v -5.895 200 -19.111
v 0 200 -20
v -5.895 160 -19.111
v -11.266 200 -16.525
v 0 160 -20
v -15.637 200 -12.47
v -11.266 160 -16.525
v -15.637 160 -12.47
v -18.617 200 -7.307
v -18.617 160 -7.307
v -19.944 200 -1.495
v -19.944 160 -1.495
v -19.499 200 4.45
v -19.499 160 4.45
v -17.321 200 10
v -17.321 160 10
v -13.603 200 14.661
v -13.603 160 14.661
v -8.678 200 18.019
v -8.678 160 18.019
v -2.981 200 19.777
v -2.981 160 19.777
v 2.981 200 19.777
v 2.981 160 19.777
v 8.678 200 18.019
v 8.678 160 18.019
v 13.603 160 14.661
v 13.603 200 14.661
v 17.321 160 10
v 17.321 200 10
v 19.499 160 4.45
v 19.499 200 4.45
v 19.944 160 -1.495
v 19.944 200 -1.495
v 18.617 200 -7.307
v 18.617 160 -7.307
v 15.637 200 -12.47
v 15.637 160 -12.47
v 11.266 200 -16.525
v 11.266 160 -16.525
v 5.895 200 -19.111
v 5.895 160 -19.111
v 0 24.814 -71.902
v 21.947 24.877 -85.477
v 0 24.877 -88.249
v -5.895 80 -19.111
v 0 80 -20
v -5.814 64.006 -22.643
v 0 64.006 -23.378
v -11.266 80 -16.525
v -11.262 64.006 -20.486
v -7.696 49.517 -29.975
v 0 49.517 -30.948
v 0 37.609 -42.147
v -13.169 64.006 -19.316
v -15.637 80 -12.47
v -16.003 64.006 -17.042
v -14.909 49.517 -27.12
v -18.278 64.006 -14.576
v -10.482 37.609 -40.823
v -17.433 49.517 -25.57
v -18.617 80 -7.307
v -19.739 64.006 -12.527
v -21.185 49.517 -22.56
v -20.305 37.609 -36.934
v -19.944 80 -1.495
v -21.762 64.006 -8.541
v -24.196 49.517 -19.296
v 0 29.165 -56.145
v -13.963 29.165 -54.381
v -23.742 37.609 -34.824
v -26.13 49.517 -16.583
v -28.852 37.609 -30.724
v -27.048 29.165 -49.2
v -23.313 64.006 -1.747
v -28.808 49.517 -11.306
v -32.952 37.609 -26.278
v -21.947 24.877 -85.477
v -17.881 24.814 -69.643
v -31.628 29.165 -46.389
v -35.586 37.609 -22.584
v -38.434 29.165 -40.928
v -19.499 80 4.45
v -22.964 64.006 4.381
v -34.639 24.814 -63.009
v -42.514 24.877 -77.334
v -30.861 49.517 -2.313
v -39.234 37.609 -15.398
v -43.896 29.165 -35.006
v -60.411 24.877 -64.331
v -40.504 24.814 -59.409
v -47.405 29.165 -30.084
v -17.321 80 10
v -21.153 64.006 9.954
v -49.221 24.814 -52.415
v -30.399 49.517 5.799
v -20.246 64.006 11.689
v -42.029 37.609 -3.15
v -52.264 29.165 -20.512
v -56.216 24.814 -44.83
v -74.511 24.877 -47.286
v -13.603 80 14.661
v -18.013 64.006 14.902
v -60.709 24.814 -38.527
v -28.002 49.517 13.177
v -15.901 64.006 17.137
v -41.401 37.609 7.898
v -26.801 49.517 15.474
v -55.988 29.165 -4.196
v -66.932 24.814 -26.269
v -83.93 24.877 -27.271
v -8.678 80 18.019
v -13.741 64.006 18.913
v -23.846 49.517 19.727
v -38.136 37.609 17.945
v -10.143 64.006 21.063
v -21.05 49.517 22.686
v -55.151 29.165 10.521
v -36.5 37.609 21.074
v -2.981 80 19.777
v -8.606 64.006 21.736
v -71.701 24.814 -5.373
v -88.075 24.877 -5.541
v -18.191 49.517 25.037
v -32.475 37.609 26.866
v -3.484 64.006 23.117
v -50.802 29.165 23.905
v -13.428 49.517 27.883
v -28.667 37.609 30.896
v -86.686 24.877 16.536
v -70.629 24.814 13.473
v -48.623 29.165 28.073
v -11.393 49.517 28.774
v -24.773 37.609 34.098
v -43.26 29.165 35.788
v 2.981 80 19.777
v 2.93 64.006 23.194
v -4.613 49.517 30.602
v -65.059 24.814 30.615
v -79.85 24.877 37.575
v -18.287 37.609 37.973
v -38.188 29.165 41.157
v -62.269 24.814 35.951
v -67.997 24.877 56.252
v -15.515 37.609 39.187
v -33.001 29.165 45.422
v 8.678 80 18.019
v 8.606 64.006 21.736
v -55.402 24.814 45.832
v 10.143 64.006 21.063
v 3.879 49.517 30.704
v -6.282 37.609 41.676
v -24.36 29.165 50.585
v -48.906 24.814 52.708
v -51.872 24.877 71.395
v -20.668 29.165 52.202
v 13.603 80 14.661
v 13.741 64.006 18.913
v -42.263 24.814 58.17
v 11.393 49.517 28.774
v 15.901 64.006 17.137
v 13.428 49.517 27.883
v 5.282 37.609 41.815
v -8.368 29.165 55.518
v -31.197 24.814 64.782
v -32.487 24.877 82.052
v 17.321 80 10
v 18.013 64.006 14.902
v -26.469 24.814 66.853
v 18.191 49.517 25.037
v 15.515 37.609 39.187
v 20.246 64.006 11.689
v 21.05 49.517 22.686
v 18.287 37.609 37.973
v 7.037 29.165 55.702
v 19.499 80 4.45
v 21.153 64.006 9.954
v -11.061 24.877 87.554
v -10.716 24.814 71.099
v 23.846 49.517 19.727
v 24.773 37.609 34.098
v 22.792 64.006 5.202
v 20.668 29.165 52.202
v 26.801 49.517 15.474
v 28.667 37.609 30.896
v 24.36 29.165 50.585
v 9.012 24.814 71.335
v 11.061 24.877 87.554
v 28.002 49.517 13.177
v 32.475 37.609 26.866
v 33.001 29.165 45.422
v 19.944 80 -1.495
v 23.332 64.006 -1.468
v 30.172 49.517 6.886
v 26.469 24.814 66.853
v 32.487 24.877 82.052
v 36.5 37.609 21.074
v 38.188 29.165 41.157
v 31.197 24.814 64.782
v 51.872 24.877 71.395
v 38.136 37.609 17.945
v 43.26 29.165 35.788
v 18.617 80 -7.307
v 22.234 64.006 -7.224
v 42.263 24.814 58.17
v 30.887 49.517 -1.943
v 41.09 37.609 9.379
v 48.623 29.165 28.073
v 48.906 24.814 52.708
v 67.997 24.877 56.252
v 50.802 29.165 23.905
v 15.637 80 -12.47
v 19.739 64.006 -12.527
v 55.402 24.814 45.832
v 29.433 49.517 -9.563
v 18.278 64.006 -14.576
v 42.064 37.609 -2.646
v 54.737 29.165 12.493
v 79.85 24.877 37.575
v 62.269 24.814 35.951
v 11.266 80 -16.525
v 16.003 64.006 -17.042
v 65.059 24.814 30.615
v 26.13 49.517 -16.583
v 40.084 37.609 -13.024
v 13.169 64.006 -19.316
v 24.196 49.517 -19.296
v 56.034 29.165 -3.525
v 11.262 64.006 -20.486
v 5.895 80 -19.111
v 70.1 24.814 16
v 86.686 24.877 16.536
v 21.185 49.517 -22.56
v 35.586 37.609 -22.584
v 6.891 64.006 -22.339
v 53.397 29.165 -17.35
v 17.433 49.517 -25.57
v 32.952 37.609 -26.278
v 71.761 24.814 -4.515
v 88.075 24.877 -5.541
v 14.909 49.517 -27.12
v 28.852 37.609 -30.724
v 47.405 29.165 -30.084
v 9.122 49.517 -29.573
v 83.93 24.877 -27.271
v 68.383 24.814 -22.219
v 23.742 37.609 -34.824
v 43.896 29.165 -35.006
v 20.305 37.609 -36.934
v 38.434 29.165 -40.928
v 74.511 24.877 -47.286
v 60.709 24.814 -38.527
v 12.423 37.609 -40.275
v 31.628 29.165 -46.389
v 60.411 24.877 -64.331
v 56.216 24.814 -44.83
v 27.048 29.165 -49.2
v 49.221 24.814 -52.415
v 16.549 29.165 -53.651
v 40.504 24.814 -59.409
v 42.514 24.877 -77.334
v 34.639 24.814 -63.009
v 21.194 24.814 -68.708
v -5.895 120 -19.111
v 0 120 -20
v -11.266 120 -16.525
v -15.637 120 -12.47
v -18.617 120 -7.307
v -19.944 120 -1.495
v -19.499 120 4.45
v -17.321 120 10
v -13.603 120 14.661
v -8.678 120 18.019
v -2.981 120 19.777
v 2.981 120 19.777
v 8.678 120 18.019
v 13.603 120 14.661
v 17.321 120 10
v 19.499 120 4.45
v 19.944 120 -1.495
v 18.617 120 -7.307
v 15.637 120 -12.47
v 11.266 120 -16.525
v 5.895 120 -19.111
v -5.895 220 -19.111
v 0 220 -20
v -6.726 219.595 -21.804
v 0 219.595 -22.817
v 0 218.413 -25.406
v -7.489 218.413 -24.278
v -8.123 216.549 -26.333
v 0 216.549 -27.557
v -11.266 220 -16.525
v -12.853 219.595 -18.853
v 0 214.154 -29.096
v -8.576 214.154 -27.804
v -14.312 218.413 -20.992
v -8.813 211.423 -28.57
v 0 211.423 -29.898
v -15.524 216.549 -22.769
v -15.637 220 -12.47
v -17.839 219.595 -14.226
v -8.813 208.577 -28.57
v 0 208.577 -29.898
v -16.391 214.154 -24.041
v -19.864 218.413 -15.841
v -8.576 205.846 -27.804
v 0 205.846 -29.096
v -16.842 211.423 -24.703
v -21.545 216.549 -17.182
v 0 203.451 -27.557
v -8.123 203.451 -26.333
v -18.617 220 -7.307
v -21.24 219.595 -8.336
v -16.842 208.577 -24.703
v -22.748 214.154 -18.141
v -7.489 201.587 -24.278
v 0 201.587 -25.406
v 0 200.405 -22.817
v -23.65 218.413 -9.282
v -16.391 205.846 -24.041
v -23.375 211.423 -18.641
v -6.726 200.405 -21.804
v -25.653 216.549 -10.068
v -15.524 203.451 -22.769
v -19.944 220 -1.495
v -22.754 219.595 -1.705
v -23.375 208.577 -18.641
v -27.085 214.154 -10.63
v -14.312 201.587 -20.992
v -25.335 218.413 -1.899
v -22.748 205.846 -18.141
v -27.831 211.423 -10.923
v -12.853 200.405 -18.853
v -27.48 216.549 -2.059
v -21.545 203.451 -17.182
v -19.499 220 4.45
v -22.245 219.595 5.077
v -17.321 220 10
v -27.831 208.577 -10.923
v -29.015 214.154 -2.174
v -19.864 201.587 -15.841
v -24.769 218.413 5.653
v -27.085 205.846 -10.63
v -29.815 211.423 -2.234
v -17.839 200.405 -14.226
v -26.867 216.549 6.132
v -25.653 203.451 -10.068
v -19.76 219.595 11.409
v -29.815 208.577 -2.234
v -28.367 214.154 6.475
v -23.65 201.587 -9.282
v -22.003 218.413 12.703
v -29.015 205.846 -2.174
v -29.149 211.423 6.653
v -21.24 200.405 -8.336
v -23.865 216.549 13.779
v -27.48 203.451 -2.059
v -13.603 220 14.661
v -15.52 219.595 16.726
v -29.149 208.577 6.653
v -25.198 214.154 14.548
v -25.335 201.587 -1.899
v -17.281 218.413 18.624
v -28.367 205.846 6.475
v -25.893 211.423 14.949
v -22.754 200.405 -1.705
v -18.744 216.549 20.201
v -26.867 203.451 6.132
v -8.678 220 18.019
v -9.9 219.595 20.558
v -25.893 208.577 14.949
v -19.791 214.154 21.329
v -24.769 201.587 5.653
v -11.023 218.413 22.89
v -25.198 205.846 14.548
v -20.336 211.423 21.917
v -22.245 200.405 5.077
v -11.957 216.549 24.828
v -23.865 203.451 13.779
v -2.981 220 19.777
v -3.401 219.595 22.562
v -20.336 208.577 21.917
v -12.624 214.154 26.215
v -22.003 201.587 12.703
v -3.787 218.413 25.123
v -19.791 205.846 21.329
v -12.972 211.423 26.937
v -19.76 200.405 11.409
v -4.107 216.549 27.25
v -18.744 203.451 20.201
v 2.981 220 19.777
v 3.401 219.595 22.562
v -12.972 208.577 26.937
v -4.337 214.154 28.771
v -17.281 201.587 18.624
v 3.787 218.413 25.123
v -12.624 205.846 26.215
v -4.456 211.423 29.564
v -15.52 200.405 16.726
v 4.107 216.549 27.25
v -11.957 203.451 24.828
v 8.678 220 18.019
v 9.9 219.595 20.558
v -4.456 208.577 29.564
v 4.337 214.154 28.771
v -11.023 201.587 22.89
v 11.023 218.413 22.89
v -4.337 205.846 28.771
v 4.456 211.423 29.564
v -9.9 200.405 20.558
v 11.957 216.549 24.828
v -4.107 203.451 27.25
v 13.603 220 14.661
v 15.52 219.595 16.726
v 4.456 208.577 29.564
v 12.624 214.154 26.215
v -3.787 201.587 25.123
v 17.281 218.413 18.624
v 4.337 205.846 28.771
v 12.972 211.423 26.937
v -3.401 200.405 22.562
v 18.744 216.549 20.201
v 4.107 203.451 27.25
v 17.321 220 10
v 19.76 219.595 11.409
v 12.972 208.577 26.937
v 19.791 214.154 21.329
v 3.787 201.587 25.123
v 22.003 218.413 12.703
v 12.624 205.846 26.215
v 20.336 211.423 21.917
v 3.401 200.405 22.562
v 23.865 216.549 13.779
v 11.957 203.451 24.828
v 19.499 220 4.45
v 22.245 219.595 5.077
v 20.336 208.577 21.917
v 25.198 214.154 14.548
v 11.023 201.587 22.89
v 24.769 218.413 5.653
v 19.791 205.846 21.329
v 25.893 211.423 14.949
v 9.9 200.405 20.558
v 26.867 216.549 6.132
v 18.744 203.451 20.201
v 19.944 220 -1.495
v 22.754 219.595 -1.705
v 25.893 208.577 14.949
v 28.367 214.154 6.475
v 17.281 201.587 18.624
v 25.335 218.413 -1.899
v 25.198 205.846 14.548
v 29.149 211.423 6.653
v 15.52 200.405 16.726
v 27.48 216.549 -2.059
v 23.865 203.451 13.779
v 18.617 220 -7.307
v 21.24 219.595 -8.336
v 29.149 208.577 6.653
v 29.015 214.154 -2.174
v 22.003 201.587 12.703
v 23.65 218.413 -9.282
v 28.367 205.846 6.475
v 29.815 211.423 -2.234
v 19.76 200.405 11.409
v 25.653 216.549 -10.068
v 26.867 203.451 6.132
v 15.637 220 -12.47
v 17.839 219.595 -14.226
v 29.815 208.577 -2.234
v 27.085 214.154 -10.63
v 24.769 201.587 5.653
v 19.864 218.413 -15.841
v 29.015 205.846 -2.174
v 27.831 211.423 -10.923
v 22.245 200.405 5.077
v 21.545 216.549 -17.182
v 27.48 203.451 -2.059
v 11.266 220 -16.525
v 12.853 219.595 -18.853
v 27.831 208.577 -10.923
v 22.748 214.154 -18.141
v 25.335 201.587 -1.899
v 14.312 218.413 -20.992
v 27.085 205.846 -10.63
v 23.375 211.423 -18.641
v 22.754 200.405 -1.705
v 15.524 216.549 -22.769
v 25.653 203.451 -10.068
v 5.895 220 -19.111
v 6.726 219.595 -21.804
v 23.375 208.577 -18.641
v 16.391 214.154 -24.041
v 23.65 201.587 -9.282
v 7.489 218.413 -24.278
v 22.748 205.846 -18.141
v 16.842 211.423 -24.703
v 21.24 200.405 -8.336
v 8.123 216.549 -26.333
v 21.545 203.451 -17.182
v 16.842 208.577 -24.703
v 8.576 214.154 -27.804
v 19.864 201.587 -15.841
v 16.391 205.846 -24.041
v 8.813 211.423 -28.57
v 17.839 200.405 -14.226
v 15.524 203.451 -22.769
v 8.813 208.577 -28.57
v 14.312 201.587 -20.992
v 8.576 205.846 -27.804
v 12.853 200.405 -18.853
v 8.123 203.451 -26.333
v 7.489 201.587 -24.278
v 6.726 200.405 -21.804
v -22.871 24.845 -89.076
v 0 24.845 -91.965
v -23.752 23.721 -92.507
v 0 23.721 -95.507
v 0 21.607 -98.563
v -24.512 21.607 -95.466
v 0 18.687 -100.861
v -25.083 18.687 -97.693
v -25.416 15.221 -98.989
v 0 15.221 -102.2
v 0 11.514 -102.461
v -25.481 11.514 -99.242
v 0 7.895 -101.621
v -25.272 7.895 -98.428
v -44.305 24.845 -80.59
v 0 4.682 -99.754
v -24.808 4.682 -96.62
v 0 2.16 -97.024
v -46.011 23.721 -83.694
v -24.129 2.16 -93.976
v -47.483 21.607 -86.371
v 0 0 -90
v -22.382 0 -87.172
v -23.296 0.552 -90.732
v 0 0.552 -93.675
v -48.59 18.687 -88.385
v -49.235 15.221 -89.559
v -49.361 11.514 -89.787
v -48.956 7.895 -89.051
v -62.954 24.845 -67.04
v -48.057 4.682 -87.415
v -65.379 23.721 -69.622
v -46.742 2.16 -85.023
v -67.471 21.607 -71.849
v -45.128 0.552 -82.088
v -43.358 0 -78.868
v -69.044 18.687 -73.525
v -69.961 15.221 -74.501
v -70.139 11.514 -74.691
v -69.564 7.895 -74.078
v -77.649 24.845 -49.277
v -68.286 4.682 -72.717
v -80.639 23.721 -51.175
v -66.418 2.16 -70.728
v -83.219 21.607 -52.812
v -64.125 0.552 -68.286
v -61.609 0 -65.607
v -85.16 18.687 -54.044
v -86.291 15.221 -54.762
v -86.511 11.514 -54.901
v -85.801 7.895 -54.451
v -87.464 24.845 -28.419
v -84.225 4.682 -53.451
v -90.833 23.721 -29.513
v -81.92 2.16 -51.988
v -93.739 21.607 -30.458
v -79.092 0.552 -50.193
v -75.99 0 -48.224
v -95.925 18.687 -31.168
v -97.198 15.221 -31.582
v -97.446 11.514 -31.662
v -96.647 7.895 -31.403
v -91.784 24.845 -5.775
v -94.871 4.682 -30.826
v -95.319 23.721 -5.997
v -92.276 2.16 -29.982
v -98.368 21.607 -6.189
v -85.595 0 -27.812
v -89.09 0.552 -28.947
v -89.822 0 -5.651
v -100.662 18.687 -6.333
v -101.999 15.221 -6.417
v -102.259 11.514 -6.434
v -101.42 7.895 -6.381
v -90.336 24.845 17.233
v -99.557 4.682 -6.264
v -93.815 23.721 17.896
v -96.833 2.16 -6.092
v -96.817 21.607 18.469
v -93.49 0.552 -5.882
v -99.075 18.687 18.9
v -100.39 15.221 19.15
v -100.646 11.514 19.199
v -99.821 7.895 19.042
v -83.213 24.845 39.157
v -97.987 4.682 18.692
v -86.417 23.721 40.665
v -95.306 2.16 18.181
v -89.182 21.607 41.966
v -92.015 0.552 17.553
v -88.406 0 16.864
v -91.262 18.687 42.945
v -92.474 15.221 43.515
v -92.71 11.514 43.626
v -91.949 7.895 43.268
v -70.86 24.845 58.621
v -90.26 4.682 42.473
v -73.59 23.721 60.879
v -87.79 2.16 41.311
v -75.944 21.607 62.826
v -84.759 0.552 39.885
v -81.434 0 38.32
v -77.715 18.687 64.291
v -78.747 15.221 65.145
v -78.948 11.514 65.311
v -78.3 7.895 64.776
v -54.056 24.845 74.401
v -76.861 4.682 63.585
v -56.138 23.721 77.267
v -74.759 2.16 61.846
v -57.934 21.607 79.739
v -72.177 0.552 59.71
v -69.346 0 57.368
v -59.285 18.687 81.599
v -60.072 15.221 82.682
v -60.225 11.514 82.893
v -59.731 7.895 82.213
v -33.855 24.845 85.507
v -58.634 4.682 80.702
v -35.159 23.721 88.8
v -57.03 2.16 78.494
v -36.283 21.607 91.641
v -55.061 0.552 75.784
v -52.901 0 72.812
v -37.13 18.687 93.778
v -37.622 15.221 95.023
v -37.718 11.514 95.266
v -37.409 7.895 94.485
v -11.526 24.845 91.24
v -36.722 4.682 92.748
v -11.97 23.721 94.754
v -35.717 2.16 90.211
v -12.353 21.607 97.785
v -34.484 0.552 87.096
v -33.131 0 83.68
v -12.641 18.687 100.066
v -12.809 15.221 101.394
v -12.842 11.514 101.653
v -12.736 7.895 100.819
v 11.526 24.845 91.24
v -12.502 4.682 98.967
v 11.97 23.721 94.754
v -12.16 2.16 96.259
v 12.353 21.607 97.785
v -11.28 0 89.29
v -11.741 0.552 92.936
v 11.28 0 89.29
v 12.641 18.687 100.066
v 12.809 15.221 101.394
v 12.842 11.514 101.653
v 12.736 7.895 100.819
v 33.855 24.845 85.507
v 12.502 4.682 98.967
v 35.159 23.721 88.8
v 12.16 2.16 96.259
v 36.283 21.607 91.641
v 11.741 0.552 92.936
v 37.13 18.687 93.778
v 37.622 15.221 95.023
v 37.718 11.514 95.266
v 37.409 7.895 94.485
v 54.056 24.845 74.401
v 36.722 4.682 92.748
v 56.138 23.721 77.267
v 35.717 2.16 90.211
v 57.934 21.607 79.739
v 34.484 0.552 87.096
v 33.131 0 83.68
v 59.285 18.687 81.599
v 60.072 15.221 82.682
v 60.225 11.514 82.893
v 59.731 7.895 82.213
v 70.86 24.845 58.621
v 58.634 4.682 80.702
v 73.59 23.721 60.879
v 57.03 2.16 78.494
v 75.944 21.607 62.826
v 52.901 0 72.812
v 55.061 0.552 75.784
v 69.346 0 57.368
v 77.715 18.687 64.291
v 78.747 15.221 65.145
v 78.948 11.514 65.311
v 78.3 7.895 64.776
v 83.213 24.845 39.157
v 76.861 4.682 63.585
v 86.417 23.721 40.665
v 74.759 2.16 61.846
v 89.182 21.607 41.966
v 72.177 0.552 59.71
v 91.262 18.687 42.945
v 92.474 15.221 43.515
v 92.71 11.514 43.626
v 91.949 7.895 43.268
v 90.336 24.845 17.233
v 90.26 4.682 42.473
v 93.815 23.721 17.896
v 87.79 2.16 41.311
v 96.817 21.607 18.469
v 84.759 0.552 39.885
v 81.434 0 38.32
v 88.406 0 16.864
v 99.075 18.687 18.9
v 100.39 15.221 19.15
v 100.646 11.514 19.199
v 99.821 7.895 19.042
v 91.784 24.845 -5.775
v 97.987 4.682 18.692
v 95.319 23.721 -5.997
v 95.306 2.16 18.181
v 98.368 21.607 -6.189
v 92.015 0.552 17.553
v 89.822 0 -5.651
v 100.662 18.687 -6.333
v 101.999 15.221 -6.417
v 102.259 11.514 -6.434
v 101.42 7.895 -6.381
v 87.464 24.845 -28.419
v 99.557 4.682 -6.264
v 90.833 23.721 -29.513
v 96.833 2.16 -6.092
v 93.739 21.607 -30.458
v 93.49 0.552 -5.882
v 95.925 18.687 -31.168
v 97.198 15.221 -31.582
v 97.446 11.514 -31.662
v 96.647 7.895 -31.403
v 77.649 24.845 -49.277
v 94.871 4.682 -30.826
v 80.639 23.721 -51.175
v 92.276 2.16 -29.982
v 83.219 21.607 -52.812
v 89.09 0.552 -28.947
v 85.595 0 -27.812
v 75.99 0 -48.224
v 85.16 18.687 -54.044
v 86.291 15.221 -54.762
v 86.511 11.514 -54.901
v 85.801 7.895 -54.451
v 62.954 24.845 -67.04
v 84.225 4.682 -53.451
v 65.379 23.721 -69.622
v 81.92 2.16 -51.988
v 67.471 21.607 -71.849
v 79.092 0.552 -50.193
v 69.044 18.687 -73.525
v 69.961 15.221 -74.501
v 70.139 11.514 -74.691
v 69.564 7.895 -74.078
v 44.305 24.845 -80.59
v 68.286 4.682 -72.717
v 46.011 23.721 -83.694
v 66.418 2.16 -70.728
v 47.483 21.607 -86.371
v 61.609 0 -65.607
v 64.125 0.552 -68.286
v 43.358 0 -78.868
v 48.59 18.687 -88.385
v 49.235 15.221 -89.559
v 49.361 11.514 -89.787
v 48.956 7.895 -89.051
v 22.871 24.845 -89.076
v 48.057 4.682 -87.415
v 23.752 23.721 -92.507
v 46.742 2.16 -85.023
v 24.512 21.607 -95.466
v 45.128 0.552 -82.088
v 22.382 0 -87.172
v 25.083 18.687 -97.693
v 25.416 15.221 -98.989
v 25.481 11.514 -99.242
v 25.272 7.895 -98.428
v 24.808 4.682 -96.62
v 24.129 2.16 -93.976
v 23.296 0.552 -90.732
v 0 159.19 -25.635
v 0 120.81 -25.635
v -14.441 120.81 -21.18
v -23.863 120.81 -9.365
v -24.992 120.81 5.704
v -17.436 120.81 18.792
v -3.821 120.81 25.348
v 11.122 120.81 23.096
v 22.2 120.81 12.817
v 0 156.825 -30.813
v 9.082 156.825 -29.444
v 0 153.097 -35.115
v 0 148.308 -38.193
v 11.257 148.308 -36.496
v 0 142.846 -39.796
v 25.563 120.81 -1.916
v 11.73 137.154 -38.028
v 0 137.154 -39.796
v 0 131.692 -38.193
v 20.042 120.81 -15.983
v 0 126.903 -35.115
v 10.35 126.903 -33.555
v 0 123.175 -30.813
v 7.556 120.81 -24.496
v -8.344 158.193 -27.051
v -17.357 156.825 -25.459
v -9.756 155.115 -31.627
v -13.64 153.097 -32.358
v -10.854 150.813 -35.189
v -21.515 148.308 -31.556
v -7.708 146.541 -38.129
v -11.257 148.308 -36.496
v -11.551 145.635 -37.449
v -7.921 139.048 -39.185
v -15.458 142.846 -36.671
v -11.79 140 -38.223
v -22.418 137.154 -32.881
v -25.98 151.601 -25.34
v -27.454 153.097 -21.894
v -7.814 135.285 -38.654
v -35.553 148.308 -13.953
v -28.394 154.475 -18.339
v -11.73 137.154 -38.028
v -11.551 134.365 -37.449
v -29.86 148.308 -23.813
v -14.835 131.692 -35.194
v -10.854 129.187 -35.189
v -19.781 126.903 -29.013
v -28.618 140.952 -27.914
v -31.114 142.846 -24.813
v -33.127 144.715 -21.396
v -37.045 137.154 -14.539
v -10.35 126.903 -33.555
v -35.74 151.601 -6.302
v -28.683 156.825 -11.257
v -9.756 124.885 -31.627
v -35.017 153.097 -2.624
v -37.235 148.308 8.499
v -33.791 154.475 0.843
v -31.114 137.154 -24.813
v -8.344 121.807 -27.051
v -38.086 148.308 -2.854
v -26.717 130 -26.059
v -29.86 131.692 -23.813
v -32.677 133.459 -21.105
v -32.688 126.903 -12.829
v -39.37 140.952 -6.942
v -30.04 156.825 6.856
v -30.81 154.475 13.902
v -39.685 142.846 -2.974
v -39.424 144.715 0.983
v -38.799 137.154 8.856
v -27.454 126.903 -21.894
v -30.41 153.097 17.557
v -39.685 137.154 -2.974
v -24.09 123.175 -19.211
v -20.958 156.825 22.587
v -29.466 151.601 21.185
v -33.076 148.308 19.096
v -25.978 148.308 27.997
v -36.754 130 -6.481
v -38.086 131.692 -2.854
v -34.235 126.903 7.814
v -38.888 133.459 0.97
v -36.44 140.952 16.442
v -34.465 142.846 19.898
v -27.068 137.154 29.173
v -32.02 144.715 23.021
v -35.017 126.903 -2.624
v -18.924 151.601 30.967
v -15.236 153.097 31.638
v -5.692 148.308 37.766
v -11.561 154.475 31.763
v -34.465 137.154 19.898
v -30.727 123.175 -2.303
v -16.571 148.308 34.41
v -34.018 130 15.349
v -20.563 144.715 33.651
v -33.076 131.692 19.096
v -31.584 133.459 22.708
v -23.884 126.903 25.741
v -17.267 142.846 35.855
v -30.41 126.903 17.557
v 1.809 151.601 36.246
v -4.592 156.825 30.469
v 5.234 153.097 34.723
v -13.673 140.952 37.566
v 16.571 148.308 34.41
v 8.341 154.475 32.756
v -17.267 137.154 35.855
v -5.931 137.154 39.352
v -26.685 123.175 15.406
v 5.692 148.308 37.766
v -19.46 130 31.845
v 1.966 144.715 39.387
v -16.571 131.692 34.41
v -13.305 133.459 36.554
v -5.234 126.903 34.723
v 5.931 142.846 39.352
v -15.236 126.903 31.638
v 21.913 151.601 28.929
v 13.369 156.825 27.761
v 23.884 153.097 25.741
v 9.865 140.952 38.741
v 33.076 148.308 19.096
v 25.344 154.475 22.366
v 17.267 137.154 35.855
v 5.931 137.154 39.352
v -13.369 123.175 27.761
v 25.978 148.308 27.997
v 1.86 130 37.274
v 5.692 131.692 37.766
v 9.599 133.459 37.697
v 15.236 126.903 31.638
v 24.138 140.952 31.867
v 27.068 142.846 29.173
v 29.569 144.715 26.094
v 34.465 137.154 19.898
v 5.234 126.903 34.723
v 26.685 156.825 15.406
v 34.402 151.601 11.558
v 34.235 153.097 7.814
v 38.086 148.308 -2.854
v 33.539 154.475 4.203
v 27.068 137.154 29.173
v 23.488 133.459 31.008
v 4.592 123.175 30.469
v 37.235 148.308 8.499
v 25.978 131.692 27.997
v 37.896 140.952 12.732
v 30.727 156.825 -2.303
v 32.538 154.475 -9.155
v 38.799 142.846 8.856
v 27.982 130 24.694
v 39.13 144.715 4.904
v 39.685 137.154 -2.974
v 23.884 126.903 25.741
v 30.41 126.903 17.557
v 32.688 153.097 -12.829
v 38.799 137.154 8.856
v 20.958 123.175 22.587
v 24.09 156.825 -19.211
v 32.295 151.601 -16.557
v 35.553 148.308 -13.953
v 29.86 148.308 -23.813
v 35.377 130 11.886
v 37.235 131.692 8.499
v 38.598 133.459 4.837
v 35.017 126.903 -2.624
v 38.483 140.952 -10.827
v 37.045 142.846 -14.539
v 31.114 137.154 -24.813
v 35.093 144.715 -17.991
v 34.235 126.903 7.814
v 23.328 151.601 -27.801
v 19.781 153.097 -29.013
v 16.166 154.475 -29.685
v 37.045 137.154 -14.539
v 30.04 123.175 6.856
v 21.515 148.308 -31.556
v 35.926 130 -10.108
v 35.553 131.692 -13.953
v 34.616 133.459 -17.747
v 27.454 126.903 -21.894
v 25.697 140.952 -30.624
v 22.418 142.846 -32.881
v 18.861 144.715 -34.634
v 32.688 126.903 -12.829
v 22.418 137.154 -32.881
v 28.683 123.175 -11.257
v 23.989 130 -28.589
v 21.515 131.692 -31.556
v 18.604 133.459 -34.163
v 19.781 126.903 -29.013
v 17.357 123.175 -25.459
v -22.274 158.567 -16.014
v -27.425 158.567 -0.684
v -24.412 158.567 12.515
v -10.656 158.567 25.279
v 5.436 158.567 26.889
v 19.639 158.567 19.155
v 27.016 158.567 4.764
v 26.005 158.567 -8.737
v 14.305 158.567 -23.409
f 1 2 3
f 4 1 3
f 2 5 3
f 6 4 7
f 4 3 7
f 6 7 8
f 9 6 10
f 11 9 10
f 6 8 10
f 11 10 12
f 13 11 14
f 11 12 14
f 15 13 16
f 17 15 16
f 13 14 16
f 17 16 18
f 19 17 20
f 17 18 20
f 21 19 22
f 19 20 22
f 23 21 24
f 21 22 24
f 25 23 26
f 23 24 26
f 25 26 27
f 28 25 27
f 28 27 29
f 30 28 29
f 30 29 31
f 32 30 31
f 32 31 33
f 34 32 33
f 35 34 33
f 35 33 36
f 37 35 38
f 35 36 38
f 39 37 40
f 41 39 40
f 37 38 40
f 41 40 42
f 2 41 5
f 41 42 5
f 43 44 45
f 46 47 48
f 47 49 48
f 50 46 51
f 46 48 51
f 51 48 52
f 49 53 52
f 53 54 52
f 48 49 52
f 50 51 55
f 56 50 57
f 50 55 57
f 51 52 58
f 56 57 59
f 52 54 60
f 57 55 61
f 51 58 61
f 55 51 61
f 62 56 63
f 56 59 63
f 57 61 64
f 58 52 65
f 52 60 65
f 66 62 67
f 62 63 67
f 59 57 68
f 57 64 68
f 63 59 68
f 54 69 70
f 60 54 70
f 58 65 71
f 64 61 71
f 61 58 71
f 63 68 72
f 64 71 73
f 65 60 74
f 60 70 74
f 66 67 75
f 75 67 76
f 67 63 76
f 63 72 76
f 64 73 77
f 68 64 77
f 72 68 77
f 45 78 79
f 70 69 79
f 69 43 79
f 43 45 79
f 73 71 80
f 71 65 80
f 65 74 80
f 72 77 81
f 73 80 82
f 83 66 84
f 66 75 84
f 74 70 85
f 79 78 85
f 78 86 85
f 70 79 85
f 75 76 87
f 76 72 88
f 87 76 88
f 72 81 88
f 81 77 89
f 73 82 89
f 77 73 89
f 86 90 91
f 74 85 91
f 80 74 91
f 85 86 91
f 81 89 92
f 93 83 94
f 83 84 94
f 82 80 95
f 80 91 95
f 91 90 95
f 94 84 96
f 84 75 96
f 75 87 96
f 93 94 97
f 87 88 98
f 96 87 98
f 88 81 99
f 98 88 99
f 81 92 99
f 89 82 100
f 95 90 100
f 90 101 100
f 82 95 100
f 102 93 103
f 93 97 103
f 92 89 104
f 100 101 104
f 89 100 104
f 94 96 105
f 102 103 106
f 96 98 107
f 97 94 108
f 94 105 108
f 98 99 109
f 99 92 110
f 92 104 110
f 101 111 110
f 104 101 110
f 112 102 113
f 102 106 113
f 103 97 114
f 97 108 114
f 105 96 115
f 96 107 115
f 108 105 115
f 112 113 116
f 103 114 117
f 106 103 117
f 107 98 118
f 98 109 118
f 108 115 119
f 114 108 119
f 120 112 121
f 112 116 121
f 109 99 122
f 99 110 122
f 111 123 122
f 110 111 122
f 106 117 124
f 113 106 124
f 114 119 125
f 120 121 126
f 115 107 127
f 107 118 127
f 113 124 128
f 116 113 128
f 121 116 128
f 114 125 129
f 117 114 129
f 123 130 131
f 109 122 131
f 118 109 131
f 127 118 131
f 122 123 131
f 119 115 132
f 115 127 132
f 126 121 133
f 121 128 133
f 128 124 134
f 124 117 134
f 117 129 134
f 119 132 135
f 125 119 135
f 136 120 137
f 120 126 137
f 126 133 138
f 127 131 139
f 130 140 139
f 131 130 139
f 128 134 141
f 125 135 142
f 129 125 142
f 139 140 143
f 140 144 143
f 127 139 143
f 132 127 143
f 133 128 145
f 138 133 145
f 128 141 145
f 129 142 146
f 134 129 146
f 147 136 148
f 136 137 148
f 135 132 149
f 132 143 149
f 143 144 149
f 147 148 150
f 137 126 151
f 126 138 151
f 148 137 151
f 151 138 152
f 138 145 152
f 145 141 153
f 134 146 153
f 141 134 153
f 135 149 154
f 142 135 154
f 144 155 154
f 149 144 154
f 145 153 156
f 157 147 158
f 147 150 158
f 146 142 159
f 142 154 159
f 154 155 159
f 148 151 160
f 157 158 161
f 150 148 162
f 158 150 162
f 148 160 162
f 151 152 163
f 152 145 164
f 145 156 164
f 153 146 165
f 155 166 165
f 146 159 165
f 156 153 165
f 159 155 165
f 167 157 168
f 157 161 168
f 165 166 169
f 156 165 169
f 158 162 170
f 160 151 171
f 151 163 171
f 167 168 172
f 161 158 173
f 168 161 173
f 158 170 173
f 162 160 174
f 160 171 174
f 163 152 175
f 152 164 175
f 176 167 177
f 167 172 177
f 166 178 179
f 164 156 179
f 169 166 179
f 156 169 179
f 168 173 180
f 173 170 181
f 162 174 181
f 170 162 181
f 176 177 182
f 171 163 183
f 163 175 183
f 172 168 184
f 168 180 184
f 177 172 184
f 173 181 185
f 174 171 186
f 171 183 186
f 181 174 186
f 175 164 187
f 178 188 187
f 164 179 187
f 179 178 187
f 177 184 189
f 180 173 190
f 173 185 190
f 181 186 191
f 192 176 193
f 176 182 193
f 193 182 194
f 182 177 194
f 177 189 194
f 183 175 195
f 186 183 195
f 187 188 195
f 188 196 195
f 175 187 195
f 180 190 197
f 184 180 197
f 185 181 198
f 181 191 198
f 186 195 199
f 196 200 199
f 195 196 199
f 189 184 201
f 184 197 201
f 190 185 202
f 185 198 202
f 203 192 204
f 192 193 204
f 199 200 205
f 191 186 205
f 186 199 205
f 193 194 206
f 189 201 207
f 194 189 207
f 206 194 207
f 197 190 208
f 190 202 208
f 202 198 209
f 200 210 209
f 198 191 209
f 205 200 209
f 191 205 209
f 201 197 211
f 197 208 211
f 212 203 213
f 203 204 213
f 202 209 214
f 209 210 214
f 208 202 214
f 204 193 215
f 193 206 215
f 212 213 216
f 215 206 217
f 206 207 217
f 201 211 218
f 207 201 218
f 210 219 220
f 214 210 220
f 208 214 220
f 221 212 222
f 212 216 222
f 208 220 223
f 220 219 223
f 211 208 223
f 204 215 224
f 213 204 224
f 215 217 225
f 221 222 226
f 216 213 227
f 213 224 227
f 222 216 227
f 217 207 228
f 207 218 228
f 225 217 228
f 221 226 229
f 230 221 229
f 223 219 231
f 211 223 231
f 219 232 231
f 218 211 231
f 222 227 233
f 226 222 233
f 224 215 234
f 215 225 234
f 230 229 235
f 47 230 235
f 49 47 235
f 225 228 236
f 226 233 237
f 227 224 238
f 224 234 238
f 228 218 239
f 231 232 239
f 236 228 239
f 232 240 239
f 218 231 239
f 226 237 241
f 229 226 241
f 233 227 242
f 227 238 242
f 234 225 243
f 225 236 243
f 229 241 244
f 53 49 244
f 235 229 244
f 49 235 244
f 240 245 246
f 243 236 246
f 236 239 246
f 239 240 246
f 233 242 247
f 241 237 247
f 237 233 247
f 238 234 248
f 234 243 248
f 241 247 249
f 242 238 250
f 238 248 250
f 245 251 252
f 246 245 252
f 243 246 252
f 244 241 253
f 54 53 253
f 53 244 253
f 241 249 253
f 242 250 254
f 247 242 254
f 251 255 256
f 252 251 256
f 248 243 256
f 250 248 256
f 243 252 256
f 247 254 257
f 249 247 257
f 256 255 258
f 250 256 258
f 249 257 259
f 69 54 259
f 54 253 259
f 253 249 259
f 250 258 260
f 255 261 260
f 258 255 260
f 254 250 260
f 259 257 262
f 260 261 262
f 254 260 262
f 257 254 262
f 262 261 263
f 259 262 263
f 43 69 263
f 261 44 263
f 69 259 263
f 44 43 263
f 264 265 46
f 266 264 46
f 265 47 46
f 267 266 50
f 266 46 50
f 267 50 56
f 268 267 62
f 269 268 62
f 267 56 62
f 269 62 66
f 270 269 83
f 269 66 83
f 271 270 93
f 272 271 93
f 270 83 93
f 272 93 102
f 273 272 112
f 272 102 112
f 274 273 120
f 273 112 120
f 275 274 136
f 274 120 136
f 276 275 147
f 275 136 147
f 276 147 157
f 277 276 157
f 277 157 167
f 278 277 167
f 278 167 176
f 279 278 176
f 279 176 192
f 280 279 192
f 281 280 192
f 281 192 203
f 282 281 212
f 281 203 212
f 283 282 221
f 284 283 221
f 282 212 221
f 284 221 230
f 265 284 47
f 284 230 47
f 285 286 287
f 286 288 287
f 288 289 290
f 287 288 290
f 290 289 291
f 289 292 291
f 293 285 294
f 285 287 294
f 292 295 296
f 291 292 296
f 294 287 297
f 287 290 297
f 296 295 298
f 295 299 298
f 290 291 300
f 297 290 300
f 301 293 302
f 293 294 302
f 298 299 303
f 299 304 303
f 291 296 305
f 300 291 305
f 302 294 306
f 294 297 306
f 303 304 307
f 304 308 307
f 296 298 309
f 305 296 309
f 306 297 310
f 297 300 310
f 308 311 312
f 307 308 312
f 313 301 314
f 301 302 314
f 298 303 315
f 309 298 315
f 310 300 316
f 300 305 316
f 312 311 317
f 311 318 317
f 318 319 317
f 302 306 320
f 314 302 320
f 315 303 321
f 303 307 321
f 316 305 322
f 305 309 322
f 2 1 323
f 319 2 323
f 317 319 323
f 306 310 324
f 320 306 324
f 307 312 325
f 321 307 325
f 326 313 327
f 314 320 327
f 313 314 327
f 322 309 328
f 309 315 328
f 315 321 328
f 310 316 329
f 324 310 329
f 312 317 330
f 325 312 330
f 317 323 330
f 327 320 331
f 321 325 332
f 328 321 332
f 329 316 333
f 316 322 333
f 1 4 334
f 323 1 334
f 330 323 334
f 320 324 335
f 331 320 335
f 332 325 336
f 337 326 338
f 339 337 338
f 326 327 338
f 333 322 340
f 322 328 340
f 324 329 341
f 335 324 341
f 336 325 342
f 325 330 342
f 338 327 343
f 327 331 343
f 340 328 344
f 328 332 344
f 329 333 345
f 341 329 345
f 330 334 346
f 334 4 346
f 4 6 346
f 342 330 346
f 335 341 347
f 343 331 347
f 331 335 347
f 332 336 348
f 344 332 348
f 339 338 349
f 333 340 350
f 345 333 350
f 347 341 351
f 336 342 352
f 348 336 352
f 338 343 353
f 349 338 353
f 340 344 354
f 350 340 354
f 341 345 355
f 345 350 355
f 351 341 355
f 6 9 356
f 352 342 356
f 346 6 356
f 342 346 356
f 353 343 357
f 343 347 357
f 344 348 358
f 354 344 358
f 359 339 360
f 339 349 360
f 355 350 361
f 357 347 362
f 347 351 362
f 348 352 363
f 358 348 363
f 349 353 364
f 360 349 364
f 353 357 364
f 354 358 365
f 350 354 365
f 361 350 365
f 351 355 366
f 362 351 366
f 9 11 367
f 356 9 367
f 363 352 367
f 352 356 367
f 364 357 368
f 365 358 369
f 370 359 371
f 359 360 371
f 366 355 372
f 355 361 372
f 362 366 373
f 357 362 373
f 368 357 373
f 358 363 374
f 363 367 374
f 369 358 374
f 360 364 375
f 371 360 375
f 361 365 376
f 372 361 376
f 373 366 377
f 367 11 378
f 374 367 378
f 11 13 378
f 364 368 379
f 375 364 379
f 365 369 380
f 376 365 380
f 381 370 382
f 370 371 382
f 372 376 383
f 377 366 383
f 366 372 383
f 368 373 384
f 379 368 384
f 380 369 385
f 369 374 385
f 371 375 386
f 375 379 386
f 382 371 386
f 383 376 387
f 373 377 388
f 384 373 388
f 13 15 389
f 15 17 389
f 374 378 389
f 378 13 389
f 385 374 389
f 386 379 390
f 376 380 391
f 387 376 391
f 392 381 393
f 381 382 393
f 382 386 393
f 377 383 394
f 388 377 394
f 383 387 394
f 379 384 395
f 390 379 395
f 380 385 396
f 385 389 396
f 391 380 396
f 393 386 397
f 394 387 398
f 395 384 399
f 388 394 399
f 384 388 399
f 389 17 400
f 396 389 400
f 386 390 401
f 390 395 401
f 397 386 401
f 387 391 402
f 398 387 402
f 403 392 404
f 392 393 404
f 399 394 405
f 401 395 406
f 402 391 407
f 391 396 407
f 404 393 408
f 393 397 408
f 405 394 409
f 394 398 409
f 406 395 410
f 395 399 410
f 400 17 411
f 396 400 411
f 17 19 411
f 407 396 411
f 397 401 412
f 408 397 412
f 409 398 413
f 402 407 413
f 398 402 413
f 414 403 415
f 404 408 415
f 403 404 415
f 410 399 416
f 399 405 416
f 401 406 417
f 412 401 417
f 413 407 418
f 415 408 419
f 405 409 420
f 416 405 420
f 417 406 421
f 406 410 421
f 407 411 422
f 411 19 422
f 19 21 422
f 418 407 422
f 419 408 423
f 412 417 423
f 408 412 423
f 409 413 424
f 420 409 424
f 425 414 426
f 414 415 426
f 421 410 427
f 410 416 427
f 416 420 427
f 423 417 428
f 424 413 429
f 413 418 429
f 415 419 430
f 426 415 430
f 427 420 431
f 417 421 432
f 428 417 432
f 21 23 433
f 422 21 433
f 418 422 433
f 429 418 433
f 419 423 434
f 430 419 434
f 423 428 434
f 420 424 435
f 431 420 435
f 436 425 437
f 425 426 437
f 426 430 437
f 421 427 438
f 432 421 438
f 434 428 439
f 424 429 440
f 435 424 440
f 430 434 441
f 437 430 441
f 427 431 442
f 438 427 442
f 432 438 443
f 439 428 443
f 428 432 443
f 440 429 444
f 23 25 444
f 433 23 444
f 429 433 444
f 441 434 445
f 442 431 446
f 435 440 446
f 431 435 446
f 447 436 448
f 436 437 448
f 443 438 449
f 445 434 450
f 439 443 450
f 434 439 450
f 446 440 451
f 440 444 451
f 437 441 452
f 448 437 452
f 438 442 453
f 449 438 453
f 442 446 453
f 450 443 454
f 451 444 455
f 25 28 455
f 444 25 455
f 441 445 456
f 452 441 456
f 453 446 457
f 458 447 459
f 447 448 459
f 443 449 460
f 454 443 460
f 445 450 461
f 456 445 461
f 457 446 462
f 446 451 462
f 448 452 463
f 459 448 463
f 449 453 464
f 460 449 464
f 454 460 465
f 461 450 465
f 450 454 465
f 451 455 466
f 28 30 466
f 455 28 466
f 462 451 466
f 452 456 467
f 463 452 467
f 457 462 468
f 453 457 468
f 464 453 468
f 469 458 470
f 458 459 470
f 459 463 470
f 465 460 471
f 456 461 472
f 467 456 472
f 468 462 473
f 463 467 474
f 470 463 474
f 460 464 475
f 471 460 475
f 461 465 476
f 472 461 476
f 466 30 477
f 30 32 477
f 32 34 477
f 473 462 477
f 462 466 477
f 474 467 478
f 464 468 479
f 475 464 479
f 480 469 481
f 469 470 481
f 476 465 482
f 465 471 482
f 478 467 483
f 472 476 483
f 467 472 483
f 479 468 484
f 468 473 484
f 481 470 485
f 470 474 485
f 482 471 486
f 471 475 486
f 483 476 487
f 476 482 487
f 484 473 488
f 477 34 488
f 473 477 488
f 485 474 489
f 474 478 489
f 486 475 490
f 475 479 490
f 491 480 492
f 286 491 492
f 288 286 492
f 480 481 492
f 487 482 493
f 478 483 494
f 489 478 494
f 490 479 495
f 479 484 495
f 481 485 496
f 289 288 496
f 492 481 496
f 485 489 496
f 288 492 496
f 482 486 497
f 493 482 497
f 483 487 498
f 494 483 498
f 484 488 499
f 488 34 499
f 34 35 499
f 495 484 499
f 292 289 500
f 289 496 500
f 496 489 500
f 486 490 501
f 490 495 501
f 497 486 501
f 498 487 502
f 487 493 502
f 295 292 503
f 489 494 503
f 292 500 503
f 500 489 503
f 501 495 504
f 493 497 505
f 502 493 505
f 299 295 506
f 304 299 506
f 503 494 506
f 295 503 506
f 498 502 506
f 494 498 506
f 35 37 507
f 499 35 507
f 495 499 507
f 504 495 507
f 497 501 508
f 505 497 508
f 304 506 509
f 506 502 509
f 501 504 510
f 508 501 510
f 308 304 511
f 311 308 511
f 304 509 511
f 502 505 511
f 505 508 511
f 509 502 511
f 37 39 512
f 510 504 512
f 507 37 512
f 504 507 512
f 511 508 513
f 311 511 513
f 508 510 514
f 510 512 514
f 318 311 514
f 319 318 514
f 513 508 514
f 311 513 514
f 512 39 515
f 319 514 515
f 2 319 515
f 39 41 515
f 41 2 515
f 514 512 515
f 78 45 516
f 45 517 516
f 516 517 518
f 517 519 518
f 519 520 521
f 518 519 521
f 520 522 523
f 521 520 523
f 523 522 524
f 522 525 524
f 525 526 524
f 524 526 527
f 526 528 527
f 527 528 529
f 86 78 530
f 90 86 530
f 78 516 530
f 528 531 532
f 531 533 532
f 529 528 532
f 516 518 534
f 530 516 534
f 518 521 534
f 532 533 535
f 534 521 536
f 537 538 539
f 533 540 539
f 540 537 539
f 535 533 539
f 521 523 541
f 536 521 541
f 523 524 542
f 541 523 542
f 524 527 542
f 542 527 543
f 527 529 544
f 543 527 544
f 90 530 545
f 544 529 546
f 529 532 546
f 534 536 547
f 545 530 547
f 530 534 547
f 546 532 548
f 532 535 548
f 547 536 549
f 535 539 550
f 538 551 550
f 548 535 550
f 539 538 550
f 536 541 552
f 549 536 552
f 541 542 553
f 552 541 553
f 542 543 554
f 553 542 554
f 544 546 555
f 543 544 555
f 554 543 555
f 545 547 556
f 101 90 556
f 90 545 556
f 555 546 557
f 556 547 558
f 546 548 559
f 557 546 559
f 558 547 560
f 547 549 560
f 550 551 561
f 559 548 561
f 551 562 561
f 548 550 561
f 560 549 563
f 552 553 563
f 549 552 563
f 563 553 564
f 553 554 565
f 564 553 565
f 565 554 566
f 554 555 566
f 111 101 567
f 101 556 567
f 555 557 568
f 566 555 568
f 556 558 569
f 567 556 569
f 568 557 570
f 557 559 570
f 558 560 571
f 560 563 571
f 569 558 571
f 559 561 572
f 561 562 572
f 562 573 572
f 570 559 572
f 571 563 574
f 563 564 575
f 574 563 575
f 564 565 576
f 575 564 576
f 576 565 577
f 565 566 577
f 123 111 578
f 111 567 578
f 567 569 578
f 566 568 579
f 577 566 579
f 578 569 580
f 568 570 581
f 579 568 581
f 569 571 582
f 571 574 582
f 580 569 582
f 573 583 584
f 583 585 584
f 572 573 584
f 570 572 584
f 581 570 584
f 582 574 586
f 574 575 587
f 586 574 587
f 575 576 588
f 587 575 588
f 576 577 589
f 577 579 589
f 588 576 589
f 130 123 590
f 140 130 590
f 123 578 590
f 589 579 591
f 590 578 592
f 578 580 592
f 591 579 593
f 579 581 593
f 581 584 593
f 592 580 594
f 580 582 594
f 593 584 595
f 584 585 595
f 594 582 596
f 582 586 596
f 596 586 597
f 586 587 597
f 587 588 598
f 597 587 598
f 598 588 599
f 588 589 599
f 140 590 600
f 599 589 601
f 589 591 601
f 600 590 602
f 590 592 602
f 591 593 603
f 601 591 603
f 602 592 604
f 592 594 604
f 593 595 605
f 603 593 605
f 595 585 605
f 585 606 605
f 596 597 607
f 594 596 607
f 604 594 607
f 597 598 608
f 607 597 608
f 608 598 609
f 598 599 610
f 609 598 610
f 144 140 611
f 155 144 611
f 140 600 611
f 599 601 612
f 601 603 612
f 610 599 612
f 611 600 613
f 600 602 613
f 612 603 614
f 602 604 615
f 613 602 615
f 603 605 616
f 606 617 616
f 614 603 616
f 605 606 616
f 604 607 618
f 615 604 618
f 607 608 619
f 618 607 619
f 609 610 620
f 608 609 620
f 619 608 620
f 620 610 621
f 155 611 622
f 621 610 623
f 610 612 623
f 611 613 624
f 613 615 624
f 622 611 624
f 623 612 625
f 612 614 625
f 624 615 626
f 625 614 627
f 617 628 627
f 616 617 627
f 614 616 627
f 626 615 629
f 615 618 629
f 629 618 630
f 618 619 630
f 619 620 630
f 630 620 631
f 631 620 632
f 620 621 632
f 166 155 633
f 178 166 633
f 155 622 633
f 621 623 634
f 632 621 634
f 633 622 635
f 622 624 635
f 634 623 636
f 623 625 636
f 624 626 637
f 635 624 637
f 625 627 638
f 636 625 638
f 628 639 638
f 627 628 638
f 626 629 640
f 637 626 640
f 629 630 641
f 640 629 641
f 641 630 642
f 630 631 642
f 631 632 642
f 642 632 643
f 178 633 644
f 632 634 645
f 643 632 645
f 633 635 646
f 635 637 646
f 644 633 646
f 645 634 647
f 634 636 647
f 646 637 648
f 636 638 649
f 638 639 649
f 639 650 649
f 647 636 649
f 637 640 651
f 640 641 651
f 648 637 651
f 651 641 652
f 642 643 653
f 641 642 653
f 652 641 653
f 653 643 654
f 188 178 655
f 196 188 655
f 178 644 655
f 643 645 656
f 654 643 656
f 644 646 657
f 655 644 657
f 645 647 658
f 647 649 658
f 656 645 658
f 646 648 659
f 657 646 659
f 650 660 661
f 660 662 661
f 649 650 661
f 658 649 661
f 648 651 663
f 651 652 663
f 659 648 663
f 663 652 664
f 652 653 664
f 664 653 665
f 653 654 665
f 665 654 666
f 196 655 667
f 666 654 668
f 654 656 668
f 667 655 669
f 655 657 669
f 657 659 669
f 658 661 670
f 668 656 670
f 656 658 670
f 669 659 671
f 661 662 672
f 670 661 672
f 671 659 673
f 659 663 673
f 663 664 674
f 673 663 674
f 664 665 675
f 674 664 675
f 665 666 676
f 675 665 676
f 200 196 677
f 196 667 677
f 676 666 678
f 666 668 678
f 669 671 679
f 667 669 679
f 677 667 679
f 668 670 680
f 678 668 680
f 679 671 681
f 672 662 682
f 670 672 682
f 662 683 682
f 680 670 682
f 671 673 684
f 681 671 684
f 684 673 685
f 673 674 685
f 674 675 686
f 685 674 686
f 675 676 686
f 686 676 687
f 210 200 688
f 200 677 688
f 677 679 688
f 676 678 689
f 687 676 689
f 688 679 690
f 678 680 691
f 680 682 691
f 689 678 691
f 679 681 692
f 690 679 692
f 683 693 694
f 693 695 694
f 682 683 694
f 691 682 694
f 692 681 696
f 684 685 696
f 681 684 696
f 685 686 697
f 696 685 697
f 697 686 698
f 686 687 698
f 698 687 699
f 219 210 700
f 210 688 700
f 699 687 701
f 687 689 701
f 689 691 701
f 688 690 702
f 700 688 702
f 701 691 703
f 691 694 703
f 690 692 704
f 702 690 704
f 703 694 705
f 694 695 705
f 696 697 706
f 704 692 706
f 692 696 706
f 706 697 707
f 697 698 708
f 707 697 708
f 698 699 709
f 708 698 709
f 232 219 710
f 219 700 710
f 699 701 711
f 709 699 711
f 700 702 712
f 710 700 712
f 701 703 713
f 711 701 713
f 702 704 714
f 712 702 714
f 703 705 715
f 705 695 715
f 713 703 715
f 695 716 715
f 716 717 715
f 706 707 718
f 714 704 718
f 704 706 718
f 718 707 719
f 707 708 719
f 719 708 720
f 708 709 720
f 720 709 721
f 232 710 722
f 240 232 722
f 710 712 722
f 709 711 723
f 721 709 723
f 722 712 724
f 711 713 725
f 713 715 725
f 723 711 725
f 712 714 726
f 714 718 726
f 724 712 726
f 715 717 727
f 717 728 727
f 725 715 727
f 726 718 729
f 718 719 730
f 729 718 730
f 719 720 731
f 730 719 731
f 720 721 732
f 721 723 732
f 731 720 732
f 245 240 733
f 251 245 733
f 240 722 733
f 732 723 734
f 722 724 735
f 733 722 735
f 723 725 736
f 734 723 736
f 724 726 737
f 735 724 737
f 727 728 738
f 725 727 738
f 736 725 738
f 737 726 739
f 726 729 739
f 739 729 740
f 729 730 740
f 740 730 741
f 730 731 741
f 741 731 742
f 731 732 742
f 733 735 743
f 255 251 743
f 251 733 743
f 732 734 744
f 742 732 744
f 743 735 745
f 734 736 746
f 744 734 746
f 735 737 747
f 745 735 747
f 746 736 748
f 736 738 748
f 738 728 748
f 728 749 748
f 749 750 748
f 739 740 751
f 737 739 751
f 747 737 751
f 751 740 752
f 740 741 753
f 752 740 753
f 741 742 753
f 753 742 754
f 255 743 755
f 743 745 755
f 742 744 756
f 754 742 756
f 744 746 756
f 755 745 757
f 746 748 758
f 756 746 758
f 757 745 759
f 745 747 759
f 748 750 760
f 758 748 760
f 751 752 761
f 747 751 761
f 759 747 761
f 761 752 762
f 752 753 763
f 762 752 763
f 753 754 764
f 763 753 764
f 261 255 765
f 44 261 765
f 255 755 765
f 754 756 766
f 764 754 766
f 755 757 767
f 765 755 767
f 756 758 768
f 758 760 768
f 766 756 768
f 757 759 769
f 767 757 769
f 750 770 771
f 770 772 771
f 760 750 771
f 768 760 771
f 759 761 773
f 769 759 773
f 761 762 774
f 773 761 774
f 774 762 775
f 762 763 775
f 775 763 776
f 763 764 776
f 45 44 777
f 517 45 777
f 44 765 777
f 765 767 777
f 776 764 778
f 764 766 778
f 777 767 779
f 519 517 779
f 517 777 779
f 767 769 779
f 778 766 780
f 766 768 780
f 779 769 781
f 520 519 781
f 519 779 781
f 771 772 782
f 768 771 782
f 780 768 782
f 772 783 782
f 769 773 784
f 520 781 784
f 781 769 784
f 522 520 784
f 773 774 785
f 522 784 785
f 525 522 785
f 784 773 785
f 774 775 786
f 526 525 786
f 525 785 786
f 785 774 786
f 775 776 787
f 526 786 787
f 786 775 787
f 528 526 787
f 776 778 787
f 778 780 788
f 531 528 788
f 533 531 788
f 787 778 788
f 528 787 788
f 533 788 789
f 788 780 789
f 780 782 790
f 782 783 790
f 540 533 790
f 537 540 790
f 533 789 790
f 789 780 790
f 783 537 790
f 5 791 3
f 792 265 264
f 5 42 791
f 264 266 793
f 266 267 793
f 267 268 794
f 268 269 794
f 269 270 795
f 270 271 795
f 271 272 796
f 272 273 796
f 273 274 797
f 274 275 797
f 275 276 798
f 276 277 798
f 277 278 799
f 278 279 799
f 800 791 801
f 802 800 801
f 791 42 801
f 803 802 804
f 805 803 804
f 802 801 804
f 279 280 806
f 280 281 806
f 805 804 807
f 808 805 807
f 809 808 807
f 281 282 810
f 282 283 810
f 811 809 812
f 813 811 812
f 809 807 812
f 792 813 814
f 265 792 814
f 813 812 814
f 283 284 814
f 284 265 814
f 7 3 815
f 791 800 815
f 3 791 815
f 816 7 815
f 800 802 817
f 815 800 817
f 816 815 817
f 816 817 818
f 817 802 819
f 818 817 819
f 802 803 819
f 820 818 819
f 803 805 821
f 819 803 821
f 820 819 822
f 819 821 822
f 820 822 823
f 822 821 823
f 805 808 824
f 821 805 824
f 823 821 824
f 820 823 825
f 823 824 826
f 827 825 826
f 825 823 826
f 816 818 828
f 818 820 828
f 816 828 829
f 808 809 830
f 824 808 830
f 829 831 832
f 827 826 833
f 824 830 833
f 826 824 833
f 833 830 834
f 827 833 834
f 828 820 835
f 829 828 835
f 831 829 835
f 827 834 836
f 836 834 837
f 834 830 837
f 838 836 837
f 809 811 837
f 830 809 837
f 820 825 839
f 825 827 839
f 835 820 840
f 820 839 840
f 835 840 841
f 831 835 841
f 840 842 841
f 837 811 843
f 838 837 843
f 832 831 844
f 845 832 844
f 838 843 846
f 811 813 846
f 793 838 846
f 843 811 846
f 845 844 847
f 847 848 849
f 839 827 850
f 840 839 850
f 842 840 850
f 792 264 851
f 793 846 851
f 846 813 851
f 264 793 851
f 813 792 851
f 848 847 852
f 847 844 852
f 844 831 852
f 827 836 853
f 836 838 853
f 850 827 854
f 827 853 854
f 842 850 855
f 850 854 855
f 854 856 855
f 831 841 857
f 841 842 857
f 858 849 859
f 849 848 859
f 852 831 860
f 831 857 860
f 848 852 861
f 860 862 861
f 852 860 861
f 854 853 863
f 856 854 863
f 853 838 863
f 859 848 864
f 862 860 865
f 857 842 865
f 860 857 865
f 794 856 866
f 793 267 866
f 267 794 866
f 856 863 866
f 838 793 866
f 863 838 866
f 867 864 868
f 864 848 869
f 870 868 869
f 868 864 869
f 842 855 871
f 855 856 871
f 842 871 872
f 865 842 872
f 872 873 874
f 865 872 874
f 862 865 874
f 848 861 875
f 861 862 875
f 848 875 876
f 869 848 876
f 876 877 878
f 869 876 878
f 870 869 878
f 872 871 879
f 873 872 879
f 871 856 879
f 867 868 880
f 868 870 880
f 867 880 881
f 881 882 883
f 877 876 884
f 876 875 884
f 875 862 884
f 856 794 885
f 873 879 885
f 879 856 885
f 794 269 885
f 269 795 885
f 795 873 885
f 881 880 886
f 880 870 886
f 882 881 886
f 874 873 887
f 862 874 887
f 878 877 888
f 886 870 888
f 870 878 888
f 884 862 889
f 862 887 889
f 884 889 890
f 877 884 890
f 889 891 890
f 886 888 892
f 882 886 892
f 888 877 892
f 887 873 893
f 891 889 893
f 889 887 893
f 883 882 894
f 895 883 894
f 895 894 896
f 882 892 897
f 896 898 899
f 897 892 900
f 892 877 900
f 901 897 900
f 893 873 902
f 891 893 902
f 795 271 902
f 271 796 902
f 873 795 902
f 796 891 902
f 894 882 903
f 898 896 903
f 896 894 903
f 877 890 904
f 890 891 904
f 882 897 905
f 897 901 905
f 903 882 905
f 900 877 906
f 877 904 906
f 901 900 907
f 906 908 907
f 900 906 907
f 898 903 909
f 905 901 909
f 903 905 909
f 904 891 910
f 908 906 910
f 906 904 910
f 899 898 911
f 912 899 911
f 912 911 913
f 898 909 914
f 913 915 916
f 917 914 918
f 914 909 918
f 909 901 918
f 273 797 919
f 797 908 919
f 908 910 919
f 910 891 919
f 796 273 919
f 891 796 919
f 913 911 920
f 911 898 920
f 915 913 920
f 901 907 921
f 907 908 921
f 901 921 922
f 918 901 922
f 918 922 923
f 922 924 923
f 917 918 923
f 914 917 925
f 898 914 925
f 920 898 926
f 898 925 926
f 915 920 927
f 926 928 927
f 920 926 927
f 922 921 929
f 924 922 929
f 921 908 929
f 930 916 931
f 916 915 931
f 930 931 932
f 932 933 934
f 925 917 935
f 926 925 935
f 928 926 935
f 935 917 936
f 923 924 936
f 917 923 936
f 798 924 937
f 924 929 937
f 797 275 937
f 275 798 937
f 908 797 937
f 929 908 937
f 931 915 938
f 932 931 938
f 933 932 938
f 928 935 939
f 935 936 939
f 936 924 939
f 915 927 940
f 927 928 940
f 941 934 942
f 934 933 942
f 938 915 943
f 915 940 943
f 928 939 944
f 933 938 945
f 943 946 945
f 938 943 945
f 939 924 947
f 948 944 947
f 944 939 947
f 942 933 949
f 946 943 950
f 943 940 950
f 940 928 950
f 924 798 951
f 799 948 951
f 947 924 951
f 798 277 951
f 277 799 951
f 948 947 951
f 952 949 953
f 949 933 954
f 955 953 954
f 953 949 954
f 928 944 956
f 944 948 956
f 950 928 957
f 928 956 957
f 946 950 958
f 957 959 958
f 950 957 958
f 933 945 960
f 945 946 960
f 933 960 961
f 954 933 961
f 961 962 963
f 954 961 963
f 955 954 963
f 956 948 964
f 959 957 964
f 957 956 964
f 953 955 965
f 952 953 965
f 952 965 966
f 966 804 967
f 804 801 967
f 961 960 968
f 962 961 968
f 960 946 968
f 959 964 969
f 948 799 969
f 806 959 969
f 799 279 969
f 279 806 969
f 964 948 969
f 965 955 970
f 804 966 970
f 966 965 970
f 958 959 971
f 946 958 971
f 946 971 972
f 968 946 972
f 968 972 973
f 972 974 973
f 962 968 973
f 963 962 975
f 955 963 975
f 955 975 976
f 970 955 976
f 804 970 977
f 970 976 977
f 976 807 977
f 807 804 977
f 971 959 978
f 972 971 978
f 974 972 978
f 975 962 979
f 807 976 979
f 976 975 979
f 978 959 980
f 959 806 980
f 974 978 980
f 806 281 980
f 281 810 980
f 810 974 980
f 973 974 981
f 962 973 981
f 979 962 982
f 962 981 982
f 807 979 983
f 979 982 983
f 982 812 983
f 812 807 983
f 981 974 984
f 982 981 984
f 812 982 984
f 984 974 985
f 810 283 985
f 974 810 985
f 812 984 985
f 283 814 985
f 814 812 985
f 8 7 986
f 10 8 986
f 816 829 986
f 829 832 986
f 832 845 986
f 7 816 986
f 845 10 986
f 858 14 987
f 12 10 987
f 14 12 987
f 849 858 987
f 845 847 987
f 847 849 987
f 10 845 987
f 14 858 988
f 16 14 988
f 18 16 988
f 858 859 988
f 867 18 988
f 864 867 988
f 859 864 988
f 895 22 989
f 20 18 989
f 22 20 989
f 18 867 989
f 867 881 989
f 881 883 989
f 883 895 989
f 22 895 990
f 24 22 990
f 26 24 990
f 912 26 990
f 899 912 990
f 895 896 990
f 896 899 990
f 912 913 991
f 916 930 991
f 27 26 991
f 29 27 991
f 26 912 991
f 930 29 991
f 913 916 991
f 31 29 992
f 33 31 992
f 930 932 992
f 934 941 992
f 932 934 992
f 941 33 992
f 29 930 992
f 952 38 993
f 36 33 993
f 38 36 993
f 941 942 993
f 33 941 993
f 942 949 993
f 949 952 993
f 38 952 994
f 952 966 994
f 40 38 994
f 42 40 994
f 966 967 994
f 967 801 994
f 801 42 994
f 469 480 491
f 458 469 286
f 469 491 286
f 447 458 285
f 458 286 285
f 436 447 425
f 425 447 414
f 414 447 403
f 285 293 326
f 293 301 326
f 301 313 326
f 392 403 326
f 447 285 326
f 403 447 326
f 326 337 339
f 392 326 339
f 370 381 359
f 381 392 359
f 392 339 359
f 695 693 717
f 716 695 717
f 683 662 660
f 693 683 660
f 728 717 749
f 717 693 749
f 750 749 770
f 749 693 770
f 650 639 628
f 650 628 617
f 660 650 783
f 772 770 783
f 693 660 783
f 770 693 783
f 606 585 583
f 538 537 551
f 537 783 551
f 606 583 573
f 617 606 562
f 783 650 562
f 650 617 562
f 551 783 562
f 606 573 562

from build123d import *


with BuildPart() as part:
    # Szkic1 → Obrót1 (revolve)
    with BuildSketch(Plane.XY, mode=Mode.PRIVATE) as obr_t1_sk:
        with BuildLine():
            Line((0, 0), (0, 220))
            Line((0, 220), (20, 220))
            ThreePointArc((20, 220), (30, 210), (20, 200))
            Line((20, 200), (20, 160))
            ThreePointArc((20, 160), (40, 140), (20, 120))
            Line((20, 120), (20, 80))
            ThreePointArc((20, 80), (42.147094318, 37.608598857), (88.249440789, 24.876814713))
            ThreePointArc((88.249440789, 24.876814713), (102.469165648, 13.377444039), (90, 0))
            Line((90, 0), (0, 0))
        make_face()
    revolve(obr_t1_sk.sketch.rotate(Axis((0, 0, 0), (0, 1, 0)), 90), axis=Axis((0, 0, 0), (0, 1, 0)))


solid = part.part
